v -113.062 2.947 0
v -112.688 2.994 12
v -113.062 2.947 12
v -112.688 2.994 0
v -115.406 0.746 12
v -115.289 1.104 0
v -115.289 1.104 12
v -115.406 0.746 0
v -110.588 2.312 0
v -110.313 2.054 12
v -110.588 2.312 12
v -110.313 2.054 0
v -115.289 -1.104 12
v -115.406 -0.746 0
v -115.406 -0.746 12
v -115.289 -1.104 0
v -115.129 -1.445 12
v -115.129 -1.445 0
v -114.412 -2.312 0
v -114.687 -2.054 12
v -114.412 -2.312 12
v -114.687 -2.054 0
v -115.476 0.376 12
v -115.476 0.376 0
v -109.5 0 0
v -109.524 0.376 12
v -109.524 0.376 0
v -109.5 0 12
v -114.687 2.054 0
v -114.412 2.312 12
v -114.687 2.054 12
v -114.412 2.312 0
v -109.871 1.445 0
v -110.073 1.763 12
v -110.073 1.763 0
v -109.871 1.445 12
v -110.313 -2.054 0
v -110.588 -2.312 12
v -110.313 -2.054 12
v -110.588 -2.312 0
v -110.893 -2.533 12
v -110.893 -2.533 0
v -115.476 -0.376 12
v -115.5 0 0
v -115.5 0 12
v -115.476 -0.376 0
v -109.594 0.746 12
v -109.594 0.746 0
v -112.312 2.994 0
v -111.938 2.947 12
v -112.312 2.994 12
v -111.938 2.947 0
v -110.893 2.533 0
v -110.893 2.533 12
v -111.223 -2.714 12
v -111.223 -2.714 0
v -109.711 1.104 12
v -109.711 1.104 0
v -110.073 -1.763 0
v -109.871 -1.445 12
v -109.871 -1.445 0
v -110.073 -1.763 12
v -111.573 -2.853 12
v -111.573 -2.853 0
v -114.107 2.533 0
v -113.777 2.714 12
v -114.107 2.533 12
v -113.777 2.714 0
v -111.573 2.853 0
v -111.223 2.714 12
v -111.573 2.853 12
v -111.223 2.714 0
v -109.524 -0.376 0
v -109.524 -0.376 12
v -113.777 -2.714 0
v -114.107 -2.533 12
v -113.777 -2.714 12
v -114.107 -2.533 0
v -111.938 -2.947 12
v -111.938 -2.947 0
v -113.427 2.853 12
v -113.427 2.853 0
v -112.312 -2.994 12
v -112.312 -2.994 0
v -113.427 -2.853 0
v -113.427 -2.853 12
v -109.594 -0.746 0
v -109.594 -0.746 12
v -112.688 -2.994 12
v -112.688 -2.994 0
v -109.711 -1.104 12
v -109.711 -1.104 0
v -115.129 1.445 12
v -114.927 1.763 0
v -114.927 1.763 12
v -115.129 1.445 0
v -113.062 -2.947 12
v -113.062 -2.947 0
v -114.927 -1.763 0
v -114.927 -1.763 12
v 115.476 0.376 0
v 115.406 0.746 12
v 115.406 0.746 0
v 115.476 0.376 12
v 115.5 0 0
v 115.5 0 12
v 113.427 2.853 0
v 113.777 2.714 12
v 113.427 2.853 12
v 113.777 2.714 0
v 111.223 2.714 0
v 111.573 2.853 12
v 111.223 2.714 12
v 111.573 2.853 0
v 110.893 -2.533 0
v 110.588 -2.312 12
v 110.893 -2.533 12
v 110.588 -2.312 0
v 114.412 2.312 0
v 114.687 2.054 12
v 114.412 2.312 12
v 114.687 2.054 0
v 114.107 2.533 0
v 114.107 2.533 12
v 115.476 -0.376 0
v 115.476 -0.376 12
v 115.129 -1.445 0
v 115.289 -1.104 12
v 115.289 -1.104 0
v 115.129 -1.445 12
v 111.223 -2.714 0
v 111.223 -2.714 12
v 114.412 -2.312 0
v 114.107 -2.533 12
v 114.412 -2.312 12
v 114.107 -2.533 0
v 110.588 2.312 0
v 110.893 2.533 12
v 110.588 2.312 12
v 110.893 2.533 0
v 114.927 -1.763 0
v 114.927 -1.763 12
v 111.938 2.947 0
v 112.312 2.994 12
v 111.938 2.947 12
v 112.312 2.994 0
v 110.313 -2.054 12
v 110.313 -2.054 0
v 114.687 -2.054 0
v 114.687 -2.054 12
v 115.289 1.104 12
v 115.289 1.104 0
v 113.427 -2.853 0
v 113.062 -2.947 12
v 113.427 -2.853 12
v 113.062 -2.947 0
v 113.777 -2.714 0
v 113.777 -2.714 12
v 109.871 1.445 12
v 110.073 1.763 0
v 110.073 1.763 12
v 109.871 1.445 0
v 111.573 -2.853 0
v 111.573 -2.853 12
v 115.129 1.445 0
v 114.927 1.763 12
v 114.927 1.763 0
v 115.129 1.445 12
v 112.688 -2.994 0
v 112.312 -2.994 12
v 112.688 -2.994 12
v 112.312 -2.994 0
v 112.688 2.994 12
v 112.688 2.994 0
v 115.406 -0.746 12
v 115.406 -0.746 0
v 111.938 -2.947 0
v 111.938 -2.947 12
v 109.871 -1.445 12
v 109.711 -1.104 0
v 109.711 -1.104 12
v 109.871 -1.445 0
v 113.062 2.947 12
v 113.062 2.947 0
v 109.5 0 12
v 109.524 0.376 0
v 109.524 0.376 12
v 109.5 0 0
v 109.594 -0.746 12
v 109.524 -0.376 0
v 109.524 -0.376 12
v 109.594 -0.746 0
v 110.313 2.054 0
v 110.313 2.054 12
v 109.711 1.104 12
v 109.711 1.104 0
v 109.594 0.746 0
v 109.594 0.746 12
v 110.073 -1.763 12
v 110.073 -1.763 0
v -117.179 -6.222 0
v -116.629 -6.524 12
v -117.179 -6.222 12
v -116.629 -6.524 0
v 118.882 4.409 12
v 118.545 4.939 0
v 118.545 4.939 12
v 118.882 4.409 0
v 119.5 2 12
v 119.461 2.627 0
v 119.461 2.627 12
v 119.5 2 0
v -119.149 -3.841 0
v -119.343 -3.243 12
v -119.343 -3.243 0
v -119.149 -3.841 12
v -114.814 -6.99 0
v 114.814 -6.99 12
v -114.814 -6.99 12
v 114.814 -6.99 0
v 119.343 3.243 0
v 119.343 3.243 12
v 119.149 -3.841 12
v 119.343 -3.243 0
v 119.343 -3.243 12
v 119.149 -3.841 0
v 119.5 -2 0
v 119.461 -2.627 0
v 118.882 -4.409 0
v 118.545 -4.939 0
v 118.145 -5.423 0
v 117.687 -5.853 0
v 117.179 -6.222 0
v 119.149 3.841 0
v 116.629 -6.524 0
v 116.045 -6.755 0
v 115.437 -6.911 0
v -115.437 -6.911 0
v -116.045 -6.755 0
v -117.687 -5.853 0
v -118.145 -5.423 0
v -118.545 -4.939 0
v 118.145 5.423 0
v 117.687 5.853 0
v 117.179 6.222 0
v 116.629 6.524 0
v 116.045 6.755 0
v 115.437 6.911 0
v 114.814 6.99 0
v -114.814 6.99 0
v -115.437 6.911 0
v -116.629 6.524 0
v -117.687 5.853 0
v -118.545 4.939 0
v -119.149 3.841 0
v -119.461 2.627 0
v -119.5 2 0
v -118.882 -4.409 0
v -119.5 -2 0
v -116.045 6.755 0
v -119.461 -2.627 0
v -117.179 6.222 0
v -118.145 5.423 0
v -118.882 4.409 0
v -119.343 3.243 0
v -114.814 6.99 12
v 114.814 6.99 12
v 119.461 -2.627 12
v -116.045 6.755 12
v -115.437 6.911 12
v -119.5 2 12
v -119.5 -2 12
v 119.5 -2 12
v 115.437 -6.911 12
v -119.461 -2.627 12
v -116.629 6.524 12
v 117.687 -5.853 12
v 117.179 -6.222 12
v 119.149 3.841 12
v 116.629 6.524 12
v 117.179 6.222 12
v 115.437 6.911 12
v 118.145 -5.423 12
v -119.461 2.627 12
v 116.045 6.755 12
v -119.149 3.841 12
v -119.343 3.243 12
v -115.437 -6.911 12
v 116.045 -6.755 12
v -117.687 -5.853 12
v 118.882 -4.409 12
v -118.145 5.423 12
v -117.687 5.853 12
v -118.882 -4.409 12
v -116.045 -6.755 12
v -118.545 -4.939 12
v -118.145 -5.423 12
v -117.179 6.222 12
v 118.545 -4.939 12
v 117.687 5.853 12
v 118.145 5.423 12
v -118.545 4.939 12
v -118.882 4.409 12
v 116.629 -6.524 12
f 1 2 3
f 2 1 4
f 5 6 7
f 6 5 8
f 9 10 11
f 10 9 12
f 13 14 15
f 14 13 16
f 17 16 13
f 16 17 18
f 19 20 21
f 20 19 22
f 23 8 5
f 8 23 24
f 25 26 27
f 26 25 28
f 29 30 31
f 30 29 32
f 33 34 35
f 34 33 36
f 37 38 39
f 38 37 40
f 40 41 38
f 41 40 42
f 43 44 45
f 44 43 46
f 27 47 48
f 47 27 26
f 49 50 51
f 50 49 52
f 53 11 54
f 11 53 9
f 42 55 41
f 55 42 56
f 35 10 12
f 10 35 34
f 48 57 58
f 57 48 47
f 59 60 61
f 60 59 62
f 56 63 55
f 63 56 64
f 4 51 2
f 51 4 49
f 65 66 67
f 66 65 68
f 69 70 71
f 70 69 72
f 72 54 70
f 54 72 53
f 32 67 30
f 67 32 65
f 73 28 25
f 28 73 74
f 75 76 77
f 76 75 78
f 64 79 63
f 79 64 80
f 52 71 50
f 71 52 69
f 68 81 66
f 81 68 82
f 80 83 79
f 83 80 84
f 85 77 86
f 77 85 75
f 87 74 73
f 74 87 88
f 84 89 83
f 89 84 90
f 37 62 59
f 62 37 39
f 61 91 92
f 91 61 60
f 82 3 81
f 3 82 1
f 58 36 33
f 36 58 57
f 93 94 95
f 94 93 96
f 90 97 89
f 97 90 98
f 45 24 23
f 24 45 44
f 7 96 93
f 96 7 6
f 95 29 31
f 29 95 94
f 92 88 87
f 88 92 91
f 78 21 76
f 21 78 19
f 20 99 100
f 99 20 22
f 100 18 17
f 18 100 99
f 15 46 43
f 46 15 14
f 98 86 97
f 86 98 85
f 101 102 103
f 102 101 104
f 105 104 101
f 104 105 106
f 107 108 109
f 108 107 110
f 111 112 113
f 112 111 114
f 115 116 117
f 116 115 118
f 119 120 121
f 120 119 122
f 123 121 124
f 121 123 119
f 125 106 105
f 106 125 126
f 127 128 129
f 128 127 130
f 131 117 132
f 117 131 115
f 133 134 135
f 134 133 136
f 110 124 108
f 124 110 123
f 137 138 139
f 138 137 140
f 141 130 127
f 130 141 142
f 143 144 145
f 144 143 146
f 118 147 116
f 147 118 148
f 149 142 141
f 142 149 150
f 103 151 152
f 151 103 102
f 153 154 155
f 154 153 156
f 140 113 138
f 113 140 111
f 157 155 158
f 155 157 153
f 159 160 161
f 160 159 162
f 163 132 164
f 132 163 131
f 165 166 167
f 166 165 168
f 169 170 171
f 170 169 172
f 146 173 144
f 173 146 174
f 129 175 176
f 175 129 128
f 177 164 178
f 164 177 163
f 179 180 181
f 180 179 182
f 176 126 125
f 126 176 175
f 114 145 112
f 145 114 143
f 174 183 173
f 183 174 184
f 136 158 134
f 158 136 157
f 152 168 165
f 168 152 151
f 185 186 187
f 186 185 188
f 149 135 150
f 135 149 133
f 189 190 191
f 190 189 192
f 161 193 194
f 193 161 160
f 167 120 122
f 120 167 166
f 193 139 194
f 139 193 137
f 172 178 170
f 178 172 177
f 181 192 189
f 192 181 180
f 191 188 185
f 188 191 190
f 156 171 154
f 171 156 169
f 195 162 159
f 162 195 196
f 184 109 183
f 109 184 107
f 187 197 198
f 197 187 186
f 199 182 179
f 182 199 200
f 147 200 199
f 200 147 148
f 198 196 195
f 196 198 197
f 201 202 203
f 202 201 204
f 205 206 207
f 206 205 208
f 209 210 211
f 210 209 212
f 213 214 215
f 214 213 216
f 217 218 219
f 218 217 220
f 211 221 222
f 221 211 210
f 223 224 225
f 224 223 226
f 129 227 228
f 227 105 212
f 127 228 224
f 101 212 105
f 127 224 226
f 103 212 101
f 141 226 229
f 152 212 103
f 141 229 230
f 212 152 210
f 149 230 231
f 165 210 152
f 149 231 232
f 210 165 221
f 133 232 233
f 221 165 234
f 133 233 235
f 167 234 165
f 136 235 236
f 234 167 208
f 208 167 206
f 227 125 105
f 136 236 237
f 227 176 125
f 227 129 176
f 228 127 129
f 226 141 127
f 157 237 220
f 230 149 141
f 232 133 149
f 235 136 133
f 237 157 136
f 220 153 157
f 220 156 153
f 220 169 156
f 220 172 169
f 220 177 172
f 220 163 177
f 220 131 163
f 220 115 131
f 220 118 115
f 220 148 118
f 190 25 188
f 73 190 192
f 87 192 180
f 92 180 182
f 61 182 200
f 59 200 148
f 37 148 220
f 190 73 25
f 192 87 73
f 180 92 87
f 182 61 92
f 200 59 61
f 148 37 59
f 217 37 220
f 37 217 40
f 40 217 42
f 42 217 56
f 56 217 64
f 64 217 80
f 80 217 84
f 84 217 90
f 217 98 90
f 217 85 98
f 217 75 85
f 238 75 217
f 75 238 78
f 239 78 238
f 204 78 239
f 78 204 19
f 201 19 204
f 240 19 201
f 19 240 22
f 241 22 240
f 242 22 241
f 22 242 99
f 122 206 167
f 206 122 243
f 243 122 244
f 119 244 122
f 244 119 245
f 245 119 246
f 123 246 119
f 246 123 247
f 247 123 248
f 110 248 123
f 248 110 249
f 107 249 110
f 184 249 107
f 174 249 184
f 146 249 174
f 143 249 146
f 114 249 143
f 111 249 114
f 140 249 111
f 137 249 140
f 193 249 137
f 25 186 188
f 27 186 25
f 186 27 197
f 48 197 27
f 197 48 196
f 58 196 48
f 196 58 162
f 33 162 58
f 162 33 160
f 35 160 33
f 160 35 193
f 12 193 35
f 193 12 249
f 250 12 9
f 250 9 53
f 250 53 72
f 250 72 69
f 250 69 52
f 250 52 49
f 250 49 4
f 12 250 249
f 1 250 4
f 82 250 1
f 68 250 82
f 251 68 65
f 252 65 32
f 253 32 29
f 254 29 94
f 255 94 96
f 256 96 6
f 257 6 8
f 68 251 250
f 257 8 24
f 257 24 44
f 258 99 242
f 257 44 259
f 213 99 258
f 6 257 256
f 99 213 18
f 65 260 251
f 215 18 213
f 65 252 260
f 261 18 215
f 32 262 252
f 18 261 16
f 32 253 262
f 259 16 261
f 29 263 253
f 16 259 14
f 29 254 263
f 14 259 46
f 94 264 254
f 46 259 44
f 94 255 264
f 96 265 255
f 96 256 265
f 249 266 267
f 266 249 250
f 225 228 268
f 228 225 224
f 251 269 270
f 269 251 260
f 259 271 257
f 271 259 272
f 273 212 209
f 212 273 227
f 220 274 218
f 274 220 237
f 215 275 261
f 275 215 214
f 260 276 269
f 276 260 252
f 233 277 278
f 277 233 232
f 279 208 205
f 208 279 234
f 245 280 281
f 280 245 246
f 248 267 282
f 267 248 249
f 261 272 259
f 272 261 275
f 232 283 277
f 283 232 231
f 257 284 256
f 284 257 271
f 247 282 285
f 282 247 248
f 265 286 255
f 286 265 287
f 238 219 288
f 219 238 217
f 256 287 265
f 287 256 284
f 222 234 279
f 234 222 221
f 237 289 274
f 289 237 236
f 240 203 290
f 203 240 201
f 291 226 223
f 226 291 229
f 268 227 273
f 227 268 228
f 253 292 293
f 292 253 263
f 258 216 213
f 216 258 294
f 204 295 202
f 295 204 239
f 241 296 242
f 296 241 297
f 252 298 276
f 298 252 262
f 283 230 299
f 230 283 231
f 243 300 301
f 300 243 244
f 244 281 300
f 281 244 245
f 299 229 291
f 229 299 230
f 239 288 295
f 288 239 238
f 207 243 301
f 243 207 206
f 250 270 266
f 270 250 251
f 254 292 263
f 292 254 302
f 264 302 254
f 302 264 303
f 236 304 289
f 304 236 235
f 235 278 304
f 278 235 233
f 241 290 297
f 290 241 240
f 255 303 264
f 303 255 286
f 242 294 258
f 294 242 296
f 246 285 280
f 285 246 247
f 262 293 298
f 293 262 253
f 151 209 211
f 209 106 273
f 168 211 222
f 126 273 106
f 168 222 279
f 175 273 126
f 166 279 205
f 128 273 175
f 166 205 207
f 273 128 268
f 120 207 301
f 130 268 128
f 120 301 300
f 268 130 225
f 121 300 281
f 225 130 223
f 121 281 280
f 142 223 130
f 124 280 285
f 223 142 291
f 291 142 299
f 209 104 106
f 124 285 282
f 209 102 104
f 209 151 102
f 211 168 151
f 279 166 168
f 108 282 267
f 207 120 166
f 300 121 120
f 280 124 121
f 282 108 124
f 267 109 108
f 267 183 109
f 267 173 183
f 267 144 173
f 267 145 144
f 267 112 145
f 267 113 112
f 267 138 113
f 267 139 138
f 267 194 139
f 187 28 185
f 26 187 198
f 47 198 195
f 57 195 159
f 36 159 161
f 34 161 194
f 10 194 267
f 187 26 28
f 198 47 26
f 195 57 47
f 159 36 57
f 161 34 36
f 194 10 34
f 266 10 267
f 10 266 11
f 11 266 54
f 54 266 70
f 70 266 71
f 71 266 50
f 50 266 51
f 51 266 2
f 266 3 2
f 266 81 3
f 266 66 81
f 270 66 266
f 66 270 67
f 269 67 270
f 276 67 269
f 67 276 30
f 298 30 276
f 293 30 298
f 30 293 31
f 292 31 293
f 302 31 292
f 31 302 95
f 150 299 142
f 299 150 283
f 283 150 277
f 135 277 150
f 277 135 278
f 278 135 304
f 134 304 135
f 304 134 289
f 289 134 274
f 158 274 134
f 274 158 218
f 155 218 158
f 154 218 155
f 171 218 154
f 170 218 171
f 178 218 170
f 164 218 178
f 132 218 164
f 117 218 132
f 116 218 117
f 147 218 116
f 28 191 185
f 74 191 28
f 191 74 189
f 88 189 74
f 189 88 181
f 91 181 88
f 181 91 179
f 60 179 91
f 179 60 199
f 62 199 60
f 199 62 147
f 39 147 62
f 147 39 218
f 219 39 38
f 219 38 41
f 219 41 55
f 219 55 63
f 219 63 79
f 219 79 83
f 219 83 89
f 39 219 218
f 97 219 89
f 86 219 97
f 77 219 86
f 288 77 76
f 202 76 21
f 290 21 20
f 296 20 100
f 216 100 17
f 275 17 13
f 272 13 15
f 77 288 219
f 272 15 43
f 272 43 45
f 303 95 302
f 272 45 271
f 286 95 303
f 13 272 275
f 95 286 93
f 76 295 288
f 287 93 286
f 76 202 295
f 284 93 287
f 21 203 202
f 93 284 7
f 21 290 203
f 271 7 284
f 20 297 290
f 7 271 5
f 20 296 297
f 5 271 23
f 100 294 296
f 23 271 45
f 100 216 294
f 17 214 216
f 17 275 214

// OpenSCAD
$fn = 50;


difference() {
	union() {
		hull() {
			translate(v = [-114.5000000000, 2.0000000000, 0]) {
				cylinder(h = 12, r = 5);
			}
			translate(v = [114.5000000000, 2.0000000000, 0]) {
				cylinder(h = 12, r = 5);
			}
			translate(v = [-114.5000000000, -2.0000000000, 0]) {
				cylinder(h = 12, r = 5);
			}
			translate(v = [114.5000000000, -2.0000000000, 0]) {
				cylinder(h = 12, r = 5);
			}
		}
	}
	union() {
		translate(v = [-112.5000000000, 0.0000000000, -100.0000000000]) {
			cylinder(h = 200, r = 3.0000000000);
		}
		translate(v = [-112.5000000000, 0.0000000000, -100.0000000000]) {
			cylinder(h = 200, r = 3.0000000000);
		}
		translate(v = [112.5000000000, 0.0000000000, -100.0000000000]) {
			cylinder(h = 200, r = 3.0000000000);
		}
		translate(v = [112.5000000000, 0.0000000000, -100.0000000000]) {
			cylinder(h = 200, r = 3.0000000000);
		}
	}
}
